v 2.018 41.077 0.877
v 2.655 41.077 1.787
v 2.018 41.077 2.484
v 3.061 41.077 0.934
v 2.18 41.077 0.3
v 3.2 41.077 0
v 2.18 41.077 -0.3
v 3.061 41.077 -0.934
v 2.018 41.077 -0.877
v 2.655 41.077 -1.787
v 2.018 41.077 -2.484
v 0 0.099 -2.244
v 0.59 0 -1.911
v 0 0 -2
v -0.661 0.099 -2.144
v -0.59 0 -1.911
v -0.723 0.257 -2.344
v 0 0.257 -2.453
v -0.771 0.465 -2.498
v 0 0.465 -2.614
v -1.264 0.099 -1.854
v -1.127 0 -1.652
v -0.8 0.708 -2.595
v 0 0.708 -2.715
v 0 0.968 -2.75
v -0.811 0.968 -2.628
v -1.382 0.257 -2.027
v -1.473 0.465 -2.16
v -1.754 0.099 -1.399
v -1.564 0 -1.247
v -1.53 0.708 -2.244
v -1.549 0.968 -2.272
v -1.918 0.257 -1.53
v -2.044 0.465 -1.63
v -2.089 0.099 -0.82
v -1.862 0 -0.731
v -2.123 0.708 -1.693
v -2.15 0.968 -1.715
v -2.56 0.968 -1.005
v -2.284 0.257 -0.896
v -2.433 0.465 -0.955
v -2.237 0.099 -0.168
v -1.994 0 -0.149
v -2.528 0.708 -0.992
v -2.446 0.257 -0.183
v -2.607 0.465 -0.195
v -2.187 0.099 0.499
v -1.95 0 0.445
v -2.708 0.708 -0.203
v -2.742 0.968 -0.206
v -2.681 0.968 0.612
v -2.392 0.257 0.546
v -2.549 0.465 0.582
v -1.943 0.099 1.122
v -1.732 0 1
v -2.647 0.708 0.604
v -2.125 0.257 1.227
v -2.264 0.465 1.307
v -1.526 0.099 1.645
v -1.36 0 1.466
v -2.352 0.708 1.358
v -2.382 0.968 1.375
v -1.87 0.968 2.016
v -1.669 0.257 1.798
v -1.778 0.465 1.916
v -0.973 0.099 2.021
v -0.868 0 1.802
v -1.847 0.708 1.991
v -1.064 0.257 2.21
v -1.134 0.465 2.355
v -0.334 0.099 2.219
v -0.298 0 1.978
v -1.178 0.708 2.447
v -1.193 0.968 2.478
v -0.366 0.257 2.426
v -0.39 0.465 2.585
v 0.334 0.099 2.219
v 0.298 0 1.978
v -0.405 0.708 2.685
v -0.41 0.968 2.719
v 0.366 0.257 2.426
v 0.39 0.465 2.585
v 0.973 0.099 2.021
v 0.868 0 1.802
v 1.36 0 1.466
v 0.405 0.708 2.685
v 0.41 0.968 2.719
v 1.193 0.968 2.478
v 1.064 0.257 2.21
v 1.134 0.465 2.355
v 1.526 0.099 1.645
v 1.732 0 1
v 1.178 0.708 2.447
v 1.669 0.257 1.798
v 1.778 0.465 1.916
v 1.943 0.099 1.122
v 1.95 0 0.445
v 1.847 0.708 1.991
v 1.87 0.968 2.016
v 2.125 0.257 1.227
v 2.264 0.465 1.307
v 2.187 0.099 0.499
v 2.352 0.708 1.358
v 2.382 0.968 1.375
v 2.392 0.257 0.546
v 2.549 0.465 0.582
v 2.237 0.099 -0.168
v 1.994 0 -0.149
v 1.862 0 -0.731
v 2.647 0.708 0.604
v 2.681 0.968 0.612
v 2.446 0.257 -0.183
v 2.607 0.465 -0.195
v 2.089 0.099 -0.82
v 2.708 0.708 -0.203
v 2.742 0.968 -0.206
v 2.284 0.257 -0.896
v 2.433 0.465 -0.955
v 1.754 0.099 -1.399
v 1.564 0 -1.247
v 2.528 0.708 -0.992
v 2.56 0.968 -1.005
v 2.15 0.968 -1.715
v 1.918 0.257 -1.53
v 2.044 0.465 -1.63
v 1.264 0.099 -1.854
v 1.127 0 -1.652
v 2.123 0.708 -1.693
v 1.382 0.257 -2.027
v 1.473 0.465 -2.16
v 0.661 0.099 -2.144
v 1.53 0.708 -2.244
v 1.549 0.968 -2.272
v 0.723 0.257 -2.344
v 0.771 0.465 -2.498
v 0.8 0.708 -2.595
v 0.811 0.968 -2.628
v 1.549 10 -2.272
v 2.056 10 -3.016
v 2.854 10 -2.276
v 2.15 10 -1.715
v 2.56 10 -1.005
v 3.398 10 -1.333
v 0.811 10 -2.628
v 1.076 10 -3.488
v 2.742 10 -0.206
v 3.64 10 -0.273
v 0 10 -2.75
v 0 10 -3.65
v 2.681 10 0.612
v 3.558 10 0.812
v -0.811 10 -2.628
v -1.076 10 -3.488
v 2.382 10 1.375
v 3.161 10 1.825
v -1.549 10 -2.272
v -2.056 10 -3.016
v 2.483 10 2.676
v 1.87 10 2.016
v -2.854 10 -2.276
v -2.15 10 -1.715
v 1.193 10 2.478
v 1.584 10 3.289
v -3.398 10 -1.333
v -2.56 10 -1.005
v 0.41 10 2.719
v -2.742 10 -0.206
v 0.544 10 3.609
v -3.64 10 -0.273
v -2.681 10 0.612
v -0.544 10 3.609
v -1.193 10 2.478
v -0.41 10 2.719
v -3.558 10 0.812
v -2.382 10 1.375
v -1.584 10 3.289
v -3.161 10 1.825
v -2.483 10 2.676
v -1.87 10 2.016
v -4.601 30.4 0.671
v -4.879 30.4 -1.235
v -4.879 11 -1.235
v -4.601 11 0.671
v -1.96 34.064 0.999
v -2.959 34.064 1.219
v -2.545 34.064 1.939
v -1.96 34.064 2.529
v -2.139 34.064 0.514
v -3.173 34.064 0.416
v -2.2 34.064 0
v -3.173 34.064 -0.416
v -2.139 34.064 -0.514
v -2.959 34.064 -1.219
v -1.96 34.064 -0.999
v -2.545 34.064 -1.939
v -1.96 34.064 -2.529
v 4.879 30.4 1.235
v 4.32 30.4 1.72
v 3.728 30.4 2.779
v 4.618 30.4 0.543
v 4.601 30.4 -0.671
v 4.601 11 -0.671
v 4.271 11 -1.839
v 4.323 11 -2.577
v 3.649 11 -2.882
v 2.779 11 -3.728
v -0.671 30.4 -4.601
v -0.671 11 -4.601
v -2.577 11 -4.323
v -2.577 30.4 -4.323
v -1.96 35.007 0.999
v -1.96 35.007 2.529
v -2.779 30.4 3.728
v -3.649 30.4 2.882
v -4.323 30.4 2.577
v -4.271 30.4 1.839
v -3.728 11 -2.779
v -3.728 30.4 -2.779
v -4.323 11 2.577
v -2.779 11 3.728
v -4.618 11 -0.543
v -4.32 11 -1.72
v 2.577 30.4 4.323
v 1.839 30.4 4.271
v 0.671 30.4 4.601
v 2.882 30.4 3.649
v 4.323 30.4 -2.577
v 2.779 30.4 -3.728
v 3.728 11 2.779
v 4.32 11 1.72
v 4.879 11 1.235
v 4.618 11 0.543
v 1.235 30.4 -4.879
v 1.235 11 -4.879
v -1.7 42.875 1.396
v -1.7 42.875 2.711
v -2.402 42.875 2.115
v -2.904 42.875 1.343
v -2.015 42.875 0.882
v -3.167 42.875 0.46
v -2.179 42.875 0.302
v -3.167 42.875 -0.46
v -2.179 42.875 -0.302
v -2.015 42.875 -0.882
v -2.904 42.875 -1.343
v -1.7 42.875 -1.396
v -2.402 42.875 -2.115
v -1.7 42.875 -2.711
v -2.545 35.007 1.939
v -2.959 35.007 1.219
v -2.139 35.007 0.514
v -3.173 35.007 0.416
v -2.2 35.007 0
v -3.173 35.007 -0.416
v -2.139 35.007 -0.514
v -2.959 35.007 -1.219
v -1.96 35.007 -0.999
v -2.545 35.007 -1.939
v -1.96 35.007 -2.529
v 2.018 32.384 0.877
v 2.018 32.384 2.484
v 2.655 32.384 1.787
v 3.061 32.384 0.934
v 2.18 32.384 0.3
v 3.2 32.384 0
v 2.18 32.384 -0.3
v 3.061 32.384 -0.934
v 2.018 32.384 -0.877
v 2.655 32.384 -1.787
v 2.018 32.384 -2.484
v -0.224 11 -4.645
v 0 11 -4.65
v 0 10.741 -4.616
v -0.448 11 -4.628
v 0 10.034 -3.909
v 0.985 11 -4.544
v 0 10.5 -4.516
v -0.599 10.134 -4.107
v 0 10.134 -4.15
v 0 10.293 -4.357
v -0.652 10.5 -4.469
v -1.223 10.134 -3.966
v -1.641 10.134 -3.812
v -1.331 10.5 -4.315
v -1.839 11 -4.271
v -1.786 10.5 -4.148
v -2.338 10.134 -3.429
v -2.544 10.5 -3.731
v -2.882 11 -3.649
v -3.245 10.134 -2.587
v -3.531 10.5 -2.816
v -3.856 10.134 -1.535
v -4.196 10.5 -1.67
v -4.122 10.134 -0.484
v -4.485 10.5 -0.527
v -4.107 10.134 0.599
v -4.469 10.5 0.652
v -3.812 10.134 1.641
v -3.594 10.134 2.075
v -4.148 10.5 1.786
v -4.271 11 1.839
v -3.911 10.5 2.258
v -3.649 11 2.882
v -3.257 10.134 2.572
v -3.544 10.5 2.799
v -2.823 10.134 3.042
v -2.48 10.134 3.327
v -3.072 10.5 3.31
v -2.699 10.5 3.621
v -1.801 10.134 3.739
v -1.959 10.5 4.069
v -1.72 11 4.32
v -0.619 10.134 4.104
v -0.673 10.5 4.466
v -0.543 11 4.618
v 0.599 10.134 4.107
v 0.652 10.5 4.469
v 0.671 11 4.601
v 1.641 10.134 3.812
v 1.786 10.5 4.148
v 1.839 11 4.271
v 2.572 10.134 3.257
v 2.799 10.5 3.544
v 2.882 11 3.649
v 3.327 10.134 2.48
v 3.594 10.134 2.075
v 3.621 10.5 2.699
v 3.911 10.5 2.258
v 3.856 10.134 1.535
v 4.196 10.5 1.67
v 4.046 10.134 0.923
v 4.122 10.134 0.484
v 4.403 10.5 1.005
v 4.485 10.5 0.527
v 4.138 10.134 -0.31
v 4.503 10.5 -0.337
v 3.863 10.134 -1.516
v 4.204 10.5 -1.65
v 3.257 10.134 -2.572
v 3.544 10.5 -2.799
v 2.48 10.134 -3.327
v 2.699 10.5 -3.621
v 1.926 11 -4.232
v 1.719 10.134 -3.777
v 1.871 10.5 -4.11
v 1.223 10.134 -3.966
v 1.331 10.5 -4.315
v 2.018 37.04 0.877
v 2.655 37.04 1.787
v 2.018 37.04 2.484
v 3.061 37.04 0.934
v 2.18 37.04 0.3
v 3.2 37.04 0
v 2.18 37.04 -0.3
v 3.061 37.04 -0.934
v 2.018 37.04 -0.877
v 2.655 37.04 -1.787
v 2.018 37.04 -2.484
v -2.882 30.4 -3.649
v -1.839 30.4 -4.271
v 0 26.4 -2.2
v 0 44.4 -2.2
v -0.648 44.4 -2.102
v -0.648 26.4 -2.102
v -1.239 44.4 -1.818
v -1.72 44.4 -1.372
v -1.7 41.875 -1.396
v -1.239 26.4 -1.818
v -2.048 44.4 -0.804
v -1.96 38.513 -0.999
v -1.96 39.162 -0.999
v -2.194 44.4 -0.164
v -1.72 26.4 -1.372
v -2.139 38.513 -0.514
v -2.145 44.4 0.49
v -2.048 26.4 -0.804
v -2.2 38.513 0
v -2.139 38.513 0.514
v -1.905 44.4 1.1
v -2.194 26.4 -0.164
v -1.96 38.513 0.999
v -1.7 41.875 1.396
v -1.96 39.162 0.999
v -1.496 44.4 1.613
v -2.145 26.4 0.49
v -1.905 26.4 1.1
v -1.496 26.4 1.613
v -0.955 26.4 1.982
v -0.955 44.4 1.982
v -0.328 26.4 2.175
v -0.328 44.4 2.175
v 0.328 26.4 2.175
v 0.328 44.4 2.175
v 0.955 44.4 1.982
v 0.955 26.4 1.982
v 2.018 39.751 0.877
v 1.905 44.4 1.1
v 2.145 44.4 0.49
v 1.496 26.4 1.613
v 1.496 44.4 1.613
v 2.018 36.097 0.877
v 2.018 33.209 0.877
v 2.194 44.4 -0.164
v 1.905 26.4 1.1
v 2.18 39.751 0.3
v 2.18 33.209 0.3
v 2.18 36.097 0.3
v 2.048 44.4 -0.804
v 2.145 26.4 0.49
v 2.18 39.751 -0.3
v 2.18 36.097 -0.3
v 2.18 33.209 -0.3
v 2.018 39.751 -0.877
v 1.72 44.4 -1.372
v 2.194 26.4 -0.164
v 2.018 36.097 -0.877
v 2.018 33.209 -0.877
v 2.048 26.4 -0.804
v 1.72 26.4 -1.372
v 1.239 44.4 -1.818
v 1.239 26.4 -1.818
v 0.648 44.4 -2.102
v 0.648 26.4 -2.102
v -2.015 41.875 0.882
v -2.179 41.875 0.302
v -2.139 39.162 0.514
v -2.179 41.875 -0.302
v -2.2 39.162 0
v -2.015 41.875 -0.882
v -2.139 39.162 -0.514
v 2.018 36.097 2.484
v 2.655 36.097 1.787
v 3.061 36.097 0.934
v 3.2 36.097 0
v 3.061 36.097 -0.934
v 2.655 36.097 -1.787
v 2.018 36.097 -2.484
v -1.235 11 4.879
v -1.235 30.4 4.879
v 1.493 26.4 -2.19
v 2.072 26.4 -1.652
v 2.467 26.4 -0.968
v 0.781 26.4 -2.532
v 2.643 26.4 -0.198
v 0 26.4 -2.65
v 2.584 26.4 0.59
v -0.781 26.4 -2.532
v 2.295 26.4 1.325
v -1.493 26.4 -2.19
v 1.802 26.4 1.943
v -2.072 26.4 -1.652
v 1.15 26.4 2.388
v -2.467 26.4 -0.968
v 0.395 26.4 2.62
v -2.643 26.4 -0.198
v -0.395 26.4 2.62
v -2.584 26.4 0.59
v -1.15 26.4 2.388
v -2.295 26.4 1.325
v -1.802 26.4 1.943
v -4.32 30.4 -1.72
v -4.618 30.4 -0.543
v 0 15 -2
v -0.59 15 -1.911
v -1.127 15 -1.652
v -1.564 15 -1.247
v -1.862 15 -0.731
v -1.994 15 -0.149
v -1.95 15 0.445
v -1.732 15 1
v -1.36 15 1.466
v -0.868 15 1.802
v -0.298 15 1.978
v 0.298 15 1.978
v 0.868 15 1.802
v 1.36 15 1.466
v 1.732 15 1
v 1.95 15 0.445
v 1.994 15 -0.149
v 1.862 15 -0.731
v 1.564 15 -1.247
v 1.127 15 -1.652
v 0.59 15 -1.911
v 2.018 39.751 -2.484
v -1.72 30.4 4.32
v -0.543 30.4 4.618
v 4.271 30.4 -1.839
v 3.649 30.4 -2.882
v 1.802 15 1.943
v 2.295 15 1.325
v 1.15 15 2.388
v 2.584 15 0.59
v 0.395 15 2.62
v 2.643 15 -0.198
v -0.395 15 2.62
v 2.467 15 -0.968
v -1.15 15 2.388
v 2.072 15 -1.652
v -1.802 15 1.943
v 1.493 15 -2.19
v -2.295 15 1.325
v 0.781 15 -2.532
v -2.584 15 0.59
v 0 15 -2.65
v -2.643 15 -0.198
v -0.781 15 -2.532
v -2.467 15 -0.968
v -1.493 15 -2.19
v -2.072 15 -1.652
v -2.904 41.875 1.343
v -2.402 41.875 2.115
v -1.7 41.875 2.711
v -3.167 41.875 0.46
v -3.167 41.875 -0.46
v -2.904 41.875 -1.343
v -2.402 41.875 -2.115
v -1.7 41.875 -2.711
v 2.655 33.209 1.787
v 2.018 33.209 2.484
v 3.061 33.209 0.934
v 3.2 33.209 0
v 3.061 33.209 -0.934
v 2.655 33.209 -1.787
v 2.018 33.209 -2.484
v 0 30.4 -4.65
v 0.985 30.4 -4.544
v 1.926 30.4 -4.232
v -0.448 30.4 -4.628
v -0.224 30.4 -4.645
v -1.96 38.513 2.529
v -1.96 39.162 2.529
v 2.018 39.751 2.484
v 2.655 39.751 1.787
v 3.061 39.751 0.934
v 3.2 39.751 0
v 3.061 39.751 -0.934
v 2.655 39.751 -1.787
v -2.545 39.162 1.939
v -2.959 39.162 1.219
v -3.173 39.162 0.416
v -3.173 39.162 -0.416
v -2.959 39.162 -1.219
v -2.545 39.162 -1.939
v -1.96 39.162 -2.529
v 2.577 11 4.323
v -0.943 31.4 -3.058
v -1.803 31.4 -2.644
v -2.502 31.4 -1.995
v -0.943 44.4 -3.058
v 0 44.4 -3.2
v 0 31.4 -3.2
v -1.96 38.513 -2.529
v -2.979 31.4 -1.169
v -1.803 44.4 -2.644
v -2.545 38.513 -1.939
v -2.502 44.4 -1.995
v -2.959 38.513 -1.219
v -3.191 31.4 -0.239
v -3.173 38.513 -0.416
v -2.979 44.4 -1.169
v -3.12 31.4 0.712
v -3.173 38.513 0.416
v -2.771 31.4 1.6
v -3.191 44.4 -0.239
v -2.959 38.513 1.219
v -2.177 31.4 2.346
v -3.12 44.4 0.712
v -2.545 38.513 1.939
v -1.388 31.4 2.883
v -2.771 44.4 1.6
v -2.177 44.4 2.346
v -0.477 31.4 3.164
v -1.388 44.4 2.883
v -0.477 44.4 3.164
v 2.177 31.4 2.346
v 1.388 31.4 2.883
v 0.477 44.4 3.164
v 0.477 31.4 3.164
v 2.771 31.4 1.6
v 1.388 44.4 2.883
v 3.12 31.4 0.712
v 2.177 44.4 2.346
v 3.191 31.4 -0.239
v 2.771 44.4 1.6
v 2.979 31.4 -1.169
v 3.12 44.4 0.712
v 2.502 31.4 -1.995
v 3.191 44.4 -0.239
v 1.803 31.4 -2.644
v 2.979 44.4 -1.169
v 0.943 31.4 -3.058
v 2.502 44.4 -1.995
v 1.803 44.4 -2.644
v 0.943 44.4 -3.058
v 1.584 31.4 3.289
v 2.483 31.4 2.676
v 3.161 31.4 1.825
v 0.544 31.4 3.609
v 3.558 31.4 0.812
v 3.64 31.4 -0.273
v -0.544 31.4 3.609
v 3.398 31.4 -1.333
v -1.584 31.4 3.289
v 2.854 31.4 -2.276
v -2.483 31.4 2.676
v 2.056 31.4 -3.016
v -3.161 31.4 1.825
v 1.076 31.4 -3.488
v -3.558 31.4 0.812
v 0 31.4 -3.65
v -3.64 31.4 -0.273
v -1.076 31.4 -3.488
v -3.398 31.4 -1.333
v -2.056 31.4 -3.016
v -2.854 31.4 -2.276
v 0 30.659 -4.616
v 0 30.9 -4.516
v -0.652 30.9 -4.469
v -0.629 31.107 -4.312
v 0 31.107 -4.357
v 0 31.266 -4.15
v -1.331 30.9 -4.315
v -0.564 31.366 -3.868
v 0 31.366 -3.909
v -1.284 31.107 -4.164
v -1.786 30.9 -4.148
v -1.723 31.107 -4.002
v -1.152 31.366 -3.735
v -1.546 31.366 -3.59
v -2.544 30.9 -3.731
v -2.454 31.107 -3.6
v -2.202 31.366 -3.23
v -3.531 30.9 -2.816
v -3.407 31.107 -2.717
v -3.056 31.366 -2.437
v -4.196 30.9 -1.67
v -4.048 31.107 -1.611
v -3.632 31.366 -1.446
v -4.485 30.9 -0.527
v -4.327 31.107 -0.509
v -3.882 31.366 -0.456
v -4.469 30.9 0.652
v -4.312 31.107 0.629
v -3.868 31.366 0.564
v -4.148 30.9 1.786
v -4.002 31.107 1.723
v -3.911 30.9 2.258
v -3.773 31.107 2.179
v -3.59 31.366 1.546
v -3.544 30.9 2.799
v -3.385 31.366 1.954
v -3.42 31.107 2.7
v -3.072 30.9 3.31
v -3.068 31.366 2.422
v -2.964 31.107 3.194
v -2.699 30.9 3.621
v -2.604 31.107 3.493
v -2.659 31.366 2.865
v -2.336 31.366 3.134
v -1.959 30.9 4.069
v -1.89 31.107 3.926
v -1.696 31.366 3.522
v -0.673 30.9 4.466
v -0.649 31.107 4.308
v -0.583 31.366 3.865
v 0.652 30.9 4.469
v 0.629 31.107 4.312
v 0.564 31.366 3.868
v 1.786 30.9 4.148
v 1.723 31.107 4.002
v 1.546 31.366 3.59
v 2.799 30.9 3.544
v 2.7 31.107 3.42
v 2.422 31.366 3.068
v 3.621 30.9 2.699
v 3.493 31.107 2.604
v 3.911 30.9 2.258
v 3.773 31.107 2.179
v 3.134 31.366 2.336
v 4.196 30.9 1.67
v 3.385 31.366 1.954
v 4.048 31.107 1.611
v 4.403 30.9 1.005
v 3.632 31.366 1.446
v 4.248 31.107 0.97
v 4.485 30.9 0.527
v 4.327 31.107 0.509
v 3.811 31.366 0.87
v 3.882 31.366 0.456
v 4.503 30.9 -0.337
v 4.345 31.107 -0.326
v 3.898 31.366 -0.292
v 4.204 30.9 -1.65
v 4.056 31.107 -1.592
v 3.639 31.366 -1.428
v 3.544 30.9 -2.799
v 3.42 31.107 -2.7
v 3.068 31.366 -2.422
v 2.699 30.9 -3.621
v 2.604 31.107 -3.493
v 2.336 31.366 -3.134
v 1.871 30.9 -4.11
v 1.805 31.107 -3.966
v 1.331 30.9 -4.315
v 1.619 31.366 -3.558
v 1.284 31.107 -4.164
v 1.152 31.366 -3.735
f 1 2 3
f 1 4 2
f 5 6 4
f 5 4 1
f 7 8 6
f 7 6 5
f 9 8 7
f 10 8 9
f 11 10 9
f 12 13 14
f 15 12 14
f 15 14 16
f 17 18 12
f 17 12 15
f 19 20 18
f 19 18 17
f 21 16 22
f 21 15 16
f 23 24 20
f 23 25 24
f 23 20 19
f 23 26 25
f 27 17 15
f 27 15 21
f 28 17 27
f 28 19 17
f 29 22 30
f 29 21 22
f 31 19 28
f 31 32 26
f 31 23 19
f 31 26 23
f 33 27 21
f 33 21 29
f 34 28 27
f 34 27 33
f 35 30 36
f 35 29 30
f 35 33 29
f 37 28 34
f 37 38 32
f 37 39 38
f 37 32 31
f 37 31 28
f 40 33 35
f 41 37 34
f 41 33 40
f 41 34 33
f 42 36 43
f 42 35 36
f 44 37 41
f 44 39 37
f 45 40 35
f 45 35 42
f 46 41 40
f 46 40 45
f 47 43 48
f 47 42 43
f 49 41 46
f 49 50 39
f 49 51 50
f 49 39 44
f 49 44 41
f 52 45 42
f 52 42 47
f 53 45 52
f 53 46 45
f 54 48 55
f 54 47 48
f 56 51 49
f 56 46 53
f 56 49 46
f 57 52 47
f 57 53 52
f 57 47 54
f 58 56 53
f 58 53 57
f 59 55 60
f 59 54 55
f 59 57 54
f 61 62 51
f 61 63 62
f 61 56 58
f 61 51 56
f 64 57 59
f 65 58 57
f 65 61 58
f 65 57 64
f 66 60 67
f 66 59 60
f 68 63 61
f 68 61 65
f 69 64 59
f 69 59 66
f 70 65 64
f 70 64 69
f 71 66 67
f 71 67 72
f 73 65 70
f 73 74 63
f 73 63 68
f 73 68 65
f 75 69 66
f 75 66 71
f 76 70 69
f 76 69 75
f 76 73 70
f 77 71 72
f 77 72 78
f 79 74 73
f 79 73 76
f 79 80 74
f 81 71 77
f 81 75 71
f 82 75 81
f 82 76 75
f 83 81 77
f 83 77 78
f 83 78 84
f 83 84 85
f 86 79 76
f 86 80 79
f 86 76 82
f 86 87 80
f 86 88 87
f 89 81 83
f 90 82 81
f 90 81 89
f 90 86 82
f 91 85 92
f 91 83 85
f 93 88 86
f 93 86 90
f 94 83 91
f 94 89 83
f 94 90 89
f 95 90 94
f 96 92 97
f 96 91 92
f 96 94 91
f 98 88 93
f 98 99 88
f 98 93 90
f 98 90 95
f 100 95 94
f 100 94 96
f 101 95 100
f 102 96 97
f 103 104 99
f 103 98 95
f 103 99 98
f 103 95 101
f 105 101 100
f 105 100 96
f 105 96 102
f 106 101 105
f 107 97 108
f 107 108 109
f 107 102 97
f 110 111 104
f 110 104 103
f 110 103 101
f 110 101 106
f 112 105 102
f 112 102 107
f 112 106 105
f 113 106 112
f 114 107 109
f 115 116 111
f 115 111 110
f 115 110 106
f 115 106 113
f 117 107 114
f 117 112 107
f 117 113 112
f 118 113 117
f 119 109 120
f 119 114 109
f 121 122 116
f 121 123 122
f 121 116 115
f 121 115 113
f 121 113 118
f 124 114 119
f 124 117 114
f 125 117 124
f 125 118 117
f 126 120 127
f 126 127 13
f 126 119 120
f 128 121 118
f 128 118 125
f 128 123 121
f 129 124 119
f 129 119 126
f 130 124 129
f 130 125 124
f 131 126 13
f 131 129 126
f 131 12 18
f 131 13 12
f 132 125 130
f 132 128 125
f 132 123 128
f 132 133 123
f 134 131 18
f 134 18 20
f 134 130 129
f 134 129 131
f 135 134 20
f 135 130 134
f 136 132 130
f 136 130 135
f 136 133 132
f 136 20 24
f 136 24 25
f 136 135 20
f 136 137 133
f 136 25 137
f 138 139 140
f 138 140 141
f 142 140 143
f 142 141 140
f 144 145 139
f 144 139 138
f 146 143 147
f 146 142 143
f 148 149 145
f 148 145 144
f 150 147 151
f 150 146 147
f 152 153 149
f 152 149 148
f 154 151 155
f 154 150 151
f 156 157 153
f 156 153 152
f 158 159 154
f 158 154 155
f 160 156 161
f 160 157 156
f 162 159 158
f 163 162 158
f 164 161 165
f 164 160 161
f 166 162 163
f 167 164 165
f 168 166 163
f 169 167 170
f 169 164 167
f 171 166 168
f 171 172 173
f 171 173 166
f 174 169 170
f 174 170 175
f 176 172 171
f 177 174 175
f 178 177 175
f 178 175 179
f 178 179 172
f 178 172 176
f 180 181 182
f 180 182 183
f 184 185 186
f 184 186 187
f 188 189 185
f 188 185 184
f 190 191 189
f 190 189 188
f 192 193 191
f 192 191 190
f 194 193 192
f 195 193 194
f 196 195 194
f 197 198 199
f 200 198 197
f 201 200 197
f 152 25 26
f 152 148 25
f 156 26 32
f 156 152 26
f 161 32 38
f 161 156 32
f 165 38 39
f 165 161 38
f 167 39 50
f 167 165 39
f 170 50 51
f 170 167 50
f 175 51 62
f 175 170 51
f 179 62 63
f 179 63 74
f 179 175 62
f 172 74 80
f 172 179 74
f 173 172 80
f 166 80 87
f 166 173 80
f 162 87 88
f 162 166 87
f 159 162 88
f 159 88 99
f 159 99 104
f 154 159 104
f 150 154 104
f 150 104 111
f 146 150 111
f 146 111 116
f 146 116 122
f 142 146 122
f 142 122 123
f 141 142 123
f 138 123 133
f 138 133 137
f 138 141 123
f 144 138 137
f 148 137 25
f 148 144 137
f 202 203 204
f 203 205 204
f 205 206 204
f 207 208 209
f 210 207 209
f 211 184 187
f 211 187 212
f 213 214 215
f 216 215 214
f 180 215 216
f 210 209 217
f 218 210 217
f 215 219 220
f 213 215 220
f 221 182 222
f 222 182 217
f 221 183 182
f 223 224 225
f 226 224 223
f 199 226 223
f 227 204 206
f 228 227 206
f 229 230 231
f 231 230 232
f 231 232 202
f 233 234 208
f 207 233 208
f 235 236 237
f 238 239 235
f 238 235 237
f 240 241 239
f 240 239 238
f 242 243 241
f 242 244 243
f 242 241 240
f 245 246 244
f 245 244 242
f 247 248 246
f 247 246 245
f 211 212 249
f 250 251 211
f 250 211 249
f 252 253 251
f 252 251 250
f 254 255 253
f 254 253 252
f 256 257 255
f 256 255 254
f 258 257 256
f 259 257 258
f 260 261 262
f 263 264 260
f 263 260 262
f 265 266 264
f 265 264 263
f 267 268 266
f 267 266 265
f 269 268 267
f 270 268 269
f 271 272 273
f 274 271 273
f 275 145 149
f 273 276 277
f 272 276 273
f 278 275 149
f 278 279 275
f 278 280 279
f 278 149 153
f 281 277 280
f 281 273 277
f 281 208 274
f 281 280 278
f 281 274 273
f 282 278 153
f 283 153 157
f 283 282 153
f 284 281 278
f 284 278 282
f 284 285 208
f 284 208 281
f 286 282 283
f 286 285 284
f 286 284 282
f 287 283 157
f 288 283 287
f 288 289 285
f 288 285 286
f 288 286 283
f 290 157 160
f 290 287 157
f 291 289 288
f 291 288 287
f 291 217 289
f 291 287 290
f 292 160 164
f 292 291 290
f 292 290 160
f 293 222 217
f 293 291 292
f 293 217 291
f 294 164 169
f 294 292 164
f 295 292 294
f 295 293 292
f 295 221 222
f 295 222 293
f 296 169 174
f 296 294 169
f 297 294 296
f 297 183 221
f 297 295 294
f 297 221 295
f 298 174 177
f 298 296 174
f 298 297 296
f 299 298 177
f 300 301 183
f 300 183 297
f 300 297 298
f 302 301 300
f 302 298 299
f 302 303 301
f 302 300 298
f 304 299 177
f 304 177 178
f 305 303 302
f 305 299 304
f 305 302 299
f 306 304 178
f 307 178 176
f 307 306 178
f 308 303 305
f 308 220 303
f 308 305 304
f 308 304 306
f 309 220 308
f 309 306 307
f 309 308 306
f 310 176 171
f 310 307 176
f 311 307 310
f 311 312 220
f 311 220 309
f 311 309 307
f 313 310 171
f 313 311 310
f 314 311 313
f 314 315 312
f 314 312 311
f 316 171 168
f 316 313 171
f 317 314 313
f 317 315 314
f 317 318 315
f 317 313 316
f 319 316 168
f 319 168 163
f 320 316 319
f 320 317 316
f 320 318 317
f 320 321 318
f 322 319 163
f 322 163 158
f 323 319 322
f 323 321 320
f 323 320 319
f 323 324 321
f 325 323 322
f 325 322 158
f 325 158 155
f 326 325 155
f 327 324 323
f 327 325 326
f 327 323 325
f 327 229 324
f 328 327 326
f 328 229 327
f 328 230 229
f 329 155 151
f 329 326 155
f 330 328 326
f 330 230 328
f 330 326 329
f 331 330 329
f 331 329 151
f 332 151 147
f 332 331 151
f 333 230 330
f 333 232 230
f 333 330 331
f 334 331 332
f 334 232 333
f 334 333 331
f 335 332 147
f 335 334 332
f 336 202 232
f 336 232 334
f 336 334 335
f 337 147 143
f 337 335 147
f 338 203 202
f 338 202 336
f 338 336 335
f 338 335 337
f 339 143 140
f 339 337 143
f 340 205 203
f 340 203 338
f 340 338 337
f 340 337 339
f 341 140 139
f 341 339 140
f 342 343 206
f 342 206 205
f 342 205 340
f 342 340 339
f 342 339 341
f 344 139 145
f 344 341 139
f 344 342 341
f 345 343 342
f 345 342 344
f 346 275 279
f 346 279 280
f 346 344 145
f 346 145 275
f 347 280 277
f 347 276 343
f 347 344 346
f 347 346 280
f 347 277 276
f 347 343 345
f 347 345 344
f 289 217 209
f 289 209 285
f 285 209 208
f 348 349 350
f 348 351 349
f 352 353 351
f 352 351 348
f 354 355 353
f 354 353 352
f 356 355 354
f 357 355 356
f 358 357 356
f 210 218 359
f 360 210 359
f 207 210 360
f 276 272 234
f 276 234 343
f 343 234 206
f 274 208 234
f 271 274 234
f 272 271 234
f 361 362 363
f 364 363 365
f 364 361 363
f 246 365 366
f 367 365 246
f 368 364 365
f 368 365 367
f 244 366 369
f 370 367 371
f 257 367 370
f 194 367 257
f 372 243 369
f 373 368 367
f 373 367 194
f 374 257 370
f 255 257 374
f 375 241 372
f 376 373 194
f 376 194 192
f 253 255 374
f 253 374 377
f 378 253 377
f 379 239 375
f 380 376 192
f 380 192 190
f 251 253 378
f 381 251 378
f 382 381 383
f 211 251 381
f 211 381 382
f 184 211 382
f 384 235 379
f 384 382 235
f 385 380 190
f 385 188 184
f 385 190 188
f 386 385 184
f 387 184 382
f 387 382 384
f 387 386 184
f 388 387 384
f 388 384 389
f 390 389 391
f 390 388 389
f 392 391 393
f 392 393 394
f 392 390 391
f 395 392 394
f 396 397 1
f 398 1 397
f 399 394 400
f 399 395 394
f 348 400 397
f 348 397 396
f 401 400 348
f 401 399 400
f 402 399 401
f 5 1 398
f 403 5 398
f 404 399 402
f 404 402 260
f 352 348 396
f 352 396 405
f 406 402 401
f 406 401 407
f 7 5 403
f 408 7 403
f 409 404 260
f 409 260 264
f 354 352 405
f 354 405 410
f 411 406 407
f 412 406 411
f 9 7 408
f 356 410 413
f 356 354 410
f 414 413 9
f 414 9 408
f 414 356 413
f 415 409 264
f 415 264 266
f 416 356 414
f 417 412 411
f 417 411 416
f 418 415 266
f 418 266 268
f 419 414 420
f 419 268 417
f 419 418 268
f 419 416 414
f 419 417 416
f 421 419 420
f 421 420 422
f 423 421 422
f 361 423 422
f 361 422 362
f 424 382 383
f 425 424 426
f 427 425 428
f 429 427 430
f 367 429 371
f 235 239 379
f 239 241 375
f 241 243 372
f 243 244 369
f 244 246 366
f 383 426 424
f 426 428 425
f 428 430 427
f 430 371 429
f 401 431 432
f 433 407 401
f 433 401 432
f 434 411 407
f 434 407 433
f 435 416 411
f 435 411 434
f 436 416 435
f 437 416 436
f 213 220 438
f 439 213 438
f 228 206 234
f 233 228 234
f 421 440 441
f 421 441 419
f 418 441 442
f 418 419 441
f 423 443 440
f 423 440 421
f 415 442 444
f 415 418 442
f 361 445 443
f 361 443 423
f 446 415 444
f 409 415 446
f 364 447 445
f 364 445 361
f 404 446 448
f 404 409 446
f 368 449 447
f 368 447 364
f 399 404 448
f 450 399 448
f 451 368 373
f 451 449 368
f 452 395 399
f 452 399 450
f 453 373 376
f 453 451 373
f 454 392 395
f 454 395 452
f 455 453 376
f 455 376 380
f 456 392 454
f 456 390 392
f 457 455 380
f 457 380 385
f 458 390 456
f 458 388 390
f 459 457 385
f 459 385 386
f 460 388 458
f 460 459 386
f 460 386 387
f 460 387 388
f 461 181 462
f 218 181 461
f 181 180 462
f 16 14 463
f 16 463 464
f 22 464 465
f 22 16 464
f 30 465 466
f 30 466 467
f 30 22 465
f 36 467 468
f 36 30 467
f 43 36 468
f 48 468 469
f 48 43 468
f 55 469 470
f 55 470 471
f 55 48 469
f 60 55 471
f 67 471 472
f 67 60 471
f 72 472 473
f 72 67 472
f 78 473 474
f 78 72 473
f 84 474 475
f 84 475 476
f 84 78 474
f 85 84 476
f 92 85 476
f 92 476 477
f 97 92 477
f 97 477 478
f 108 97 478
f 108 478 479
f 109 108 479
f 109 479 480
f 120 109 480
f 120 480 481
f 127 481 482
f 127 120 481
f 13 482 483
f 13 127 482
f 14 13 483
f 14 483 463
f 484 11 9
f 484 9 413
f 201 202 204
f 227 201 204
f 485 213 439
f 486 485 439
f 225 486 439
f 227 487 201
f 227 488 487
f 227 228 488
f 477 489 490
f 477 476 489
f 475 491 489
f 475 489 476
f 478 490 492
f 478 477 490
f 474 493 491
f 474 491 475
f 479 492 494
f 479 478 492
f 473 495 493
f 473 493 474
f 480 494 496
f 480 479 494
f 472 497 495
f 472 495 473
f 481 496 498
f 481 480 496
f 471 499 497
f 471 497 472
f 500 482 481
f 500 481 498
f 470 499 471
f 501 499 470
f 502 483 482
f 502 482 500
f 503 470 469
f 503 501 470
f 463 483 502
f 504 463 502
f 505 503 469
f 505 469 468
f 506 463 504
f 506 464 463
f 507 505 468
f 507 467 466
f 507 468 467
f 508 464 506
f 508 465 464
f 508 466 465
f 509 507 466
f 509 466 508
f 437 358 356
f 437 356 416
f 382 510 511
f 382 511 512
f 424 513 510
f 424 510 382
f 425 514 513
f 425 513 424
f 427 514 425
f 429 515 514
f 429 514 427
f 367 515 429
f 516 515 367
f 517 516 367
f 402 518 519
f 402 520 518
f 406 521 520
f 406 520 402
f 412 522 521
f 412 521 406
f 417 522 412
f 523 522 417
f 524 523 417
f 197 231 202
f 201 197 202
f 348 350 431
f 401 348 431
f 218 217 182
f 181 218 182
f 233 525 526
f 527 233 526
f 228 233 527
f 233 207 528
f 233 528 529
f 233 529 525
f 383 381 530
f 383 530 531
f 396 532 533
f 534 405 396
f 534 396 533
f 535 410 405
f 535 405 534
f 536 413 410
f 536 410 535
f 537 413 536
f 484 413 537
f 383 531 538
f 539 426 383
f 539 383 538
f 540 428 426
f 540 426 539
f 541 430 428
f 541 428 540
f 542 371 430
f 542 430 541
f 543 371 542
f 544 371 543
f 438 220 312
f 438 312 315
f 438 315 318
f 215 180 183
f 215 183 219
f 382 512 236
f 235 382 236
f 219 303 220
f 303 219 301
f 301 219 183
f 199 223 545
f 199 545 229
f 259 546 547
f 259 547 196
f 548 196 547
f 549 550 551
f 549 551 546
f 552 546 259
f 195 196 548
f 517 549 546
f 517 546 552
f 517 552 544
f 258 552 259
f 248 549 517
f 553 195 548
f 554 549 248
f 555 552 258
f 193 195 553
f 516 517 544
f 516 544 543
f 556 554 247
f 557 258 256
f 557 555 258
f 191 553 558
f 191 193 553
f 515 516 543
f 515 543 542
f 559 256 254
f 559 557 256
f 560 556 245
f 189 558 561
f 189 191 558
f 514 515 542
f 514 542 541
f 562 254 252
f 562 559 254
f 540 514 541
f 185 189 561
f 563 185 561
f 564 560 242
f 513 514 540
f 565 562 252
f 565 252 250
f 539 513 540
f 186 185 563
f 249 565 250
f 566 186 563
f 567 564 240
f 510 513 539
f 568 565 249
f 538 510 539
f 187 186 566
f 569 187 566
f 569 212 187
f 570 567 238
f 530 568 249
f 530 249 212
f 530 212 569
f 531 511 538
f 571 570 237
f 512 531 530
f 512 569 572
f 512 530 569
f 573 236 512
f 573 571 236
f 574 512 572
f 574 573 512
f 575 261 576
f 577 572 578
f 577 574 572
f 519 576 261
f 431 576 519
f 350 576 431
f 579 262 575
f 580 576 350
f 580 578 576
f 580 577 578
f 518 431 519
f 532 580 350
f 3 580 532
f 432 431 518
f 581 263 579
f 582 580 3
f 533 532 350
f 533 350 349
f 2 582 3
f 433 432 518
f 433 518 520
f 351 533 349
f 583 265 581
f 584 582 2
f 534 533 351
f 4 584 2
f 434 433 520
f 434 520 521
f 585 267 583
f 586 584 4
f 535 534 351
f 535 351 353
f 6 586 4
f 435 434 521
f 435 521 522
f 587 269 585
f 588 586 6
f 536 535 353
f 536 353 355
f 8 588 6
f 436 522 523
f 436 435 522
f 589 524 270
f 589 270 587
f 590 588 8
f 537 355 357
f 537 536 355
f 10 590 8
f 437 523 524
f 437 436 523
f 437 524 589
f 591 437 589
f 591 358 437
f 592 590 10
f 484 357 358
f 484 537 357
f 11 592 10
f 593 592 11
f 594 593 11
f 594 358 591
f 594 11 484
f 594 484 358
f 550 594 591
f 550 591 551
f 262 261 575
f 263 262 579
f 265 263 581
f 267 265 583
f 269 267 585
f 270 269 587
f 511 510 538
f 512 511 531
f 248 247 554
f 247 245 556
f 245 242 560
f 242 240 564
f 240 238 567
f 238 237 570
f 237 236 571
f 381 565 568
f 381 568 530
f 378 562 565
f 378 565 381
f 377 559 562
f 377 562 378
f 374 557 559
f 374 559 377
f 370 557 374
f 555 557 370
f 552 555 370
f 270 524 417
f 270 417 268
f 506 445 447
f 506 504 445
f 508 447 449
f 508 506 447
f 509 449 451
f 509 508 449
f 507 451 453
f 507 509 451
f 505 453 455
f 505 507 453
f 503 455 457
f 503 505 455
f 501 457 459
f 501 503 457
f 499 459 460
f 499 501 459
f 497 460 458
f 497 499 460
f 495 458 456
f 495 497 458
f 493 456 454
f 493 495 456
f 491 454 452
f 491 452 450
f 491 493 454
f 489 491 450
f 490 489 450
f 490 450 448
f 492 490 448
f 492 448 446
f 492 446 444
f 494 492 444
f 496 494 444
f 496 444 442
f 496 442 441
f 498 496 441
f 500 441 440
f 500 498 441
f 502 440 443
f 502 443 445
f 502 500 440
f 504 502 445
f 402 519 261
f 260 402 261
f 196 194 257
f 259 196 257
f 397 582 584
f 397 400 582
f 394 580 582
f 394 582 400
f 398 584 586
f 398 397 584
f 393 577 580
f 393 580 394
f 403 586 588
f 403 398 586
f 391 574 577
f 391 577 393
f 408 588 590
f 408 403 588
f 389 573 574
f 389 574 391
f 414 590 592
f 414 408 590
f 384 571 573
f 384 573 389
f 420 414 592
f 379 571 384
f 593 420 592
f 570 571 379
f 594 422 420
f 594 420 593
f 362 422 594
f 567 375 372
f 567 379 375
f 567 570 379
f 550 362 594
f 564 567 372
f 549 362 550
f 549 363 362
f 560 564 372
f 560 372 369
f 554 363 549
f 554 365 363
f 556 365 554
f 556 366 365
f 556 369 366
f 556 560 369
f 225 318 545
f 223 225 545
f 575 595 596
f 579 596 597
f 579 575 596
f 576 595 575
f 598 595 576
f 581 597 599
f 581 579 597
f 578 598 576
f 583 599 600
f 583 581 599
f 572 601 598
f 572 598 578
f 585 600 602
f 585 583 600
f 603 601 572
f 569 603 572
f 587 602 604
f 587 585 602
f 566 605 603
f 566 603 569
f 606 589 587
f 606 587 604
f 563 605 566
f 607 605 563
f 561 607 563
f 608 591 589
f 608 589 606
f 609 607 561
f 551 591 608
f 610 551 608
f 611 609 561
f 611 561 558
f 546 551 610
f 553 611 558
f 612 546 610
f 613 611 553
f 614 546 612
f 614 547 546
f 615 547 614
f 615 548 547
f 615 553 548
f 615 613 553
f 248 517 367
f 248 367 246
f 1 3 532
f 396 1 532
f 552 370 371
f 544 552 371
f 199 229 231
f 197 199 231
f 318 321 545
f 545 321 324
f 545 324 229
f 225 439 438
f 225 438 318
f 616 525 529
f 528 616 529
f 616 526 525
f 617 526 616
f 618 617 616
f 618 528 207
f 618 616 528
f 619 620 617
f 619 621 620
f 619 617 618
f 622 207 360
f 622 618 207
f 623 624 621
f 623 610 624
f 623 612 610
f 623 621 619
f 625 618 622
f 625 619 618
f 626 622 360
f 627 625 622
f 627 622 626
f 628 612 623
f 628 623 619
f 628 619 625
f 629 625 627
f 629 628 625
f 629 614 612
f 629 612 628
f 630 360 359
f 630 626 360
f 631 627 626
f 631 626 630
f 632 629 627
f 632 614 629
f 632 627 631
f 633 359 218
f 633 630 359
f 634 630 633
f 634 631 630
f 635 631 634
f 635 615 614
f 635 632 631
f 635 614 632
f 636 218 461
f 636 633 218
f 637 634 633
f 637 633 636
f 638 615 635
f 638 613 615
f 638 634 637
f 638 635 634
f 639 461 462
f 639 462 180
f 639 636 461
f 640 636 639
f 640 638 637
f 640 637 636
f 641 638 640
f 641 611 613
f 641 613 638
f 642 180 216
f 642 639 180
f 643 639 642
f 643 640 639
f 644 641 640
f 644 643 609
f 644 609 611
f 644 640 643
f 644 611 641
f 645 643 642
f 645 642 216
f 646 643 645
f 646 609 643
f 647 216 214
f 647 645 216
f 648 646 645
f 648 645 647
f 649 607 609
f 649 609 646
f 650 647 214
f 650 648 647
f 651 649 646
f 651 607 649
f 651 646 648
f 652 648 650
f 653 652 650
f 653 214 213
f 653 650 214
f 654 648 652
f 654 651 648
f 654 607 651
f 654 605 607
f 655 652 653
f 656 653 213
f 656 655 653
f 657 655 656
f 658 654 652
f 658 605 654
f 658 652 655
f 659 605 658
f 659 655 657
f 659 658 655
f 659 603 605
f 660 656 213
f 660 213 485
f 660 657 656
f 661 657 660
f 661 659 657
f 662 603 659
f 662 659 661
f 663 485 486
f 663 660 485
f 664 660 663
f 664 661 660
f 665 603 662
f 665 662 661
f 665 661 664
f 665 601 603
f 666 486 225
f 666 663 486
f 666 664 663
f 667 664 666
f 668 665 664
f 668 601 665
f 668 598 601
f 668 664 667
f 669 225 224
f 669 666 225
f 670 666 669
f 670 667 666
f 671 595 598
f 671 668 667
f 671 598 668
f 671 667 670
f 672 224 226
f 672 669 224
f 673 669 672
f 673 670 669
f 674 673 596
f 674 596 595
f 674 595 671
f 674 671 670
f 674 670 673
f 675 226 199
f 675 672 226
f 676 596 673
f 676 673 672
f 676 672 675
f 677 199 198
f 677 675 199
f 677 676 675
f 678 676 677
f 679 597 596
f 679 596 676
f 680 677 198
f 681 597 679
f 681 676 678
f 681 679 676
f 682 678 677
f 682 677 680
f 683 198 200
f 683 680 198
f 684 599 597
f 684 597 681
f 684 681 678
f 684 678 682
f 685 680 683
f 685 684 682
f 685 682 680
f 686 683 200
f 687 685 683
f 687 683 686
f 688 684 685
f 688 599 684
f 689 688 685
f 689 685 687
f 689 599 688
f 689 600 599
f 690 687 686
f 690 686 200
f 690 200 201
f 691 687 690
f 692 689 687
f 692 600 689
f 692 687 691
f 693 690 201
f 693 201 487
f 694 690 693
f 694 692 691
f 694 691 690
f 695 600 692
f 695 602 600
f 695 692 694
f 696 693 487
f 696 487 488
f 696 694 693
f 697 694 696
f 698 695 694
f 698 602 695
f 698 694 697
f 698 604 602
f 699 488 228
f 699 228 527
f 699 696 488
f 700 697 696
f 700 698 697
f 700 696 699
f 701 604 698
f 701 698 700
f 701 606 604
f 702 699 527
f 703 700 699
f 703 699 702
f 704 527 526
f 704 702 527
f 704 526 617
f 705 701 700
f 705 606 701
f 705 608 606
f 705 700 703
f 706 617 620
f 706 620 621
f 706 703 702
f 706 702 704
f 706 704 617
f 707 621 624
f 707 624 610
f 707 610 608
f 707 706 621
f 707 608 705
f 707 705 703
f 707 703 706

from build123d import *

# Parameters (mm, degrees)
FILLET_1_R               = 1
EXTRUDE_START            = -19.4
EXTRUDE_1_DEPTH          = 19.4
CUT_EXTRUDE_8_DEPTH      = 45.932997117
CUT_EXTRUDE_8_DEPTH_BACK = 45.932997117


with BuildPart() as part:
    # 草图1 → 旋转1 (revolve)
    with BuildSketch(Plane.XY, mode=Mode.PRIVATE) as revolve_1_sk:
        Polygon((2, 15), (2, 0), (2.75, 0), (2.75, 10), (4.65, 10), (4.65, 31.4), (3.2, 31.4), (3.2, 44.4), (2.2, 44.4), (2.2, 26.4), (2.65, 26.4), (2.65, 15), align=None)
    revolve(revolve_1_sk.sketch.rotate(Axis((0, -4.665178571, 0), (0, 1, 0)), 90), axis=Axis((0, -4.665178571, 0), (0, 1, 0)))

    # 圆角1
    # the kernel refuses this fillet: 1 mm, written as the material it takes off along each edge
    with BuildSketch(Plane(origin=(0, 31.4, 0), x_dir=(0, 0, -1), z_dir=(1, 0, 0))) as fillet_1_piece_1:
        with BuildLine():
            CenterArc((4.65 - FILLET_1_R, -FILLET_1_R), FILLET_1_R, 0, 90)
            Line((4.65 - FILLET_1_R, 0), (4.65 - FILLET_1_R, FILLET_1_R * 0.02))
            Line((4.65 - FILLET_1_R, FILLET_1_R * 0.02), (4.65 + FILLET_1_R * 0.02, FILLET_1_R * 0.02))
            Line((4.65 + FILLET_1_R * 0.02, FILLET_1_R * 0.02), (4.65 + FILLET_1_R * 0.02, -FILLET_1_R))
            Line((4.65 + FILLET_1_R * 0.02, -FILLET_1_R), (4.65, -FILLET_1_R))
        make_face()
    revolve(axis=Axis((0, 31.4, 0), (0, 1, 0)), mode=Mode.SUBTRACT)
    with BuildSketch(Plane(origin=(0, 10, 0), x_dir=(0, 0, -1), z_dir=(1, 0, 0))) as fillet_1_piece_2:
        with BuildLine():
            CenterArc((4.65 - FILLET_1_R, FILLET_1_R), FILLET_1_R, 270, 90)
            Line((4.65, FILLET_1_R), (4.65 + FILLET_1_R * 0.02, FILLET_1_R))
            Line((4.65 + FILLET_1_R * 0.02, FILLET_1_R), (4.65 + FILLET_1_R * 0.02, -FILLET_1_R * 0.02))
            Line((4.65 + FILLET_1_R * 0.02, -FILLET_1_R * 0.02), (4.65 - FILLET_1_R, -FILLET_1_R * 0.02))
            Line((4.65 - FILLET_1_R, -FILLET_1_R * 0.02), (4.65 - FILLET_1_R, 0))
        make_face()
    revolve(axis=Axis((0, 10, 0), (0, 1, 0)), mode=Mode.SUBTRACT)
    with BuildSketch(Plane(origin=(0, 0, 0), x_dir=(0, 0, -1), z_dir=(1, 0, 0))) as fillet_1_piece_3:
        with BuildLine():
            CenterArc((1.75, 0.968245837), FILLET_1_R, 284.477512186, 75.522487814)
            Line((2.75, 0.968245837), (2.77, 0.968245837))
            Line((2.77, 0.968245837), (2.77, 0))
            Line((2.77, 0), (2.75, -0.02))
            ThreePointArc((2.75, -0.02), (2.375, -0.02), (2.005, -0.019364917))
            Line((2.005, -0.019364917), (2, 0))
        make_face()
    revolve(axis=Axis((0, 0, 0), (0, 1, 0)), mode=Mode.SUBTRACT)

    # 草图2 → 凸台-拉伸1 (add)
    with BuildSketch(Plane(origin=(0, 30.4, 0), x_dir=(1, 0, 0), z_dir=(0, 1, 0)).offset(EXTRUDE_START)):
        with BuildLine():
            Line((2.779213221, 3.728065701), (1.234997781, 4.879253527))
            Line((1.234997781, 4.879253527), (-0.670940138, 4.601341036))
            ThreePointArc((-0.670940138, 4.601341036), (1.140989177, 4.507842466), (2.779213221, 3.728065701))
        make_face()
        with BuildLine():
            ThreePointArc((-3.728065726, 2.779213188), (-2.38072481, 3.99432715), (-0.670940138, 4.601341036))
            Line((-0.670940138, 4.601341036), (-2.57687795, 4.323428561))
            Line((-2.57687795, 4.323428561), (-3.728065726, 2.779213188))
        make_face()
        with BuildLine():
            Line((4.323428561, 2.57687795), (2.779213221, 3.728065701))
            ThreePointArc((2.779213221, 3.728065701), (3.994327171, 2.380724774), (4.601341042, 0.670940096))
            Line((4.601341042, 0.670940096), (4.323428561, 2.57687795))
        make_face()
        with BuildLine():
            ThreePointArc((-4.601341043, -0.67094009), (-4.507842465, 1.14098918), (-3.728065726, 2.779213188))
            Line((-3.728065726, 2.779213188), (-4.879253527, 1.234997781))
            Line((-4.879253527, 1.234997781), (-4.601341043, -0.67094009))
        make_face()
        with BuildLine():
            Line((4.879253527, -1.234997781), (4.601341042, 0.670940096))
            ThreePointArc((4.601341042, 0.670940096), (4.50784246, -1.1409892), (3.728065698, -2.779213226))
            Line((3.728065698, -2.779213226), (4.879253527, -1.234997781))
        make_face()
        with BuildLine():
            ThreePointArc((-2.779213228, -3.728065696), (-3.994327175, -2.380724768), (-4.601341043, -0.67094009))
            Line((-4.601341043, -0.67094009), (-4.323428561, -2.57687795))
            Line((-4.323428561, -2.57687795), (-2.779213228, -3.728065696))
        make_face()
        with BuildLine():
            ThreePointArc((0.670940034, -4.601341051), (-1.140989232, -4.507842452), (-2.779213228, -3.728065696))
            Line((-2.779213228, -3.728065696), (-1.234997781, -4.879253527))
            Line((-1.234997781, -4.879253527), (0.670940034, -4.601341051))
        make_face()
        with BuildLine():
            Line((2.57687795, -4.323428561), (3.728065698, -2.779213226))
            ThreePointArc((3.728065698, -2.779213226), (2.380724745, -3.994327189), (0.670940034, -4.601341051))
            Line((0.670940034, -4.601341051), (2.57687795, -4.323428561))
        make_face()
    extrude(amount=EXTRUDE_1_DEPTH)

    # 草图3 → 切除-拉伸8 (cut, two sides: drawn at the far end of the back side and taken through both)
    with BuildSketch(Plane.XY.offset(-CUT_EXTRUDE_8_DEPTH_BACK)):
        Polygon((-3.65, 42.874542092), (-3.65, 41.874542092), (-3.2, 41.874542092), (-1.7, 41.874542092), (-1.7, 42.874542092), (-3.2, 42.874542092), (-3.263750078, 42.874542092), align=None)
        Polygon((-3.65, 39.16171454), (-3.65, 38.513443063), (-3.2, 38.513443063), (-1.960187726, 38.513443063), (-1.960187726, 39.16171454), (-3.2, 39.16171454), align=None)
        Polygon((-3.65, 34.063943377), (-3.2, 34.063943377), (-1.960187726, 34.063943377), (-1.960187726, 35.006883708), (-3.2, 35.006883708), (-3.65, 35.006883708), align=None)
        Polygon((3.2, 36.097158465), (3.65, 36.097158465), (3.65, 37.040098796), (3.2, 37.040098796), (2.017841794, 37.040098796), (2.017841794, 36.097158465), align=None)
        Polygon((3.2, 39.751052247), (3.65, 39.751052247), (3.65, 41.077062087), (3.2, 41.077062087), (2.017841794, 41.077062087), (2.017841794, 39.751052247), align=None)
        Polygon((3.2, 32.384330913), (3.65, 32.384330913), (3.65, 33.209403702), (3.277688682, 33.209403702), (3.2, 33.209403702), (2.017841794, 33.209403702), (2.017841794, 32.384330913), align=None)
    extrude(amount=CUT_EXTRUDE_8_DEPTH + CUT_EXTRUDE_8_DEPTH_BACK, mode=Mode.SUBTRACT)


solid = part.part
